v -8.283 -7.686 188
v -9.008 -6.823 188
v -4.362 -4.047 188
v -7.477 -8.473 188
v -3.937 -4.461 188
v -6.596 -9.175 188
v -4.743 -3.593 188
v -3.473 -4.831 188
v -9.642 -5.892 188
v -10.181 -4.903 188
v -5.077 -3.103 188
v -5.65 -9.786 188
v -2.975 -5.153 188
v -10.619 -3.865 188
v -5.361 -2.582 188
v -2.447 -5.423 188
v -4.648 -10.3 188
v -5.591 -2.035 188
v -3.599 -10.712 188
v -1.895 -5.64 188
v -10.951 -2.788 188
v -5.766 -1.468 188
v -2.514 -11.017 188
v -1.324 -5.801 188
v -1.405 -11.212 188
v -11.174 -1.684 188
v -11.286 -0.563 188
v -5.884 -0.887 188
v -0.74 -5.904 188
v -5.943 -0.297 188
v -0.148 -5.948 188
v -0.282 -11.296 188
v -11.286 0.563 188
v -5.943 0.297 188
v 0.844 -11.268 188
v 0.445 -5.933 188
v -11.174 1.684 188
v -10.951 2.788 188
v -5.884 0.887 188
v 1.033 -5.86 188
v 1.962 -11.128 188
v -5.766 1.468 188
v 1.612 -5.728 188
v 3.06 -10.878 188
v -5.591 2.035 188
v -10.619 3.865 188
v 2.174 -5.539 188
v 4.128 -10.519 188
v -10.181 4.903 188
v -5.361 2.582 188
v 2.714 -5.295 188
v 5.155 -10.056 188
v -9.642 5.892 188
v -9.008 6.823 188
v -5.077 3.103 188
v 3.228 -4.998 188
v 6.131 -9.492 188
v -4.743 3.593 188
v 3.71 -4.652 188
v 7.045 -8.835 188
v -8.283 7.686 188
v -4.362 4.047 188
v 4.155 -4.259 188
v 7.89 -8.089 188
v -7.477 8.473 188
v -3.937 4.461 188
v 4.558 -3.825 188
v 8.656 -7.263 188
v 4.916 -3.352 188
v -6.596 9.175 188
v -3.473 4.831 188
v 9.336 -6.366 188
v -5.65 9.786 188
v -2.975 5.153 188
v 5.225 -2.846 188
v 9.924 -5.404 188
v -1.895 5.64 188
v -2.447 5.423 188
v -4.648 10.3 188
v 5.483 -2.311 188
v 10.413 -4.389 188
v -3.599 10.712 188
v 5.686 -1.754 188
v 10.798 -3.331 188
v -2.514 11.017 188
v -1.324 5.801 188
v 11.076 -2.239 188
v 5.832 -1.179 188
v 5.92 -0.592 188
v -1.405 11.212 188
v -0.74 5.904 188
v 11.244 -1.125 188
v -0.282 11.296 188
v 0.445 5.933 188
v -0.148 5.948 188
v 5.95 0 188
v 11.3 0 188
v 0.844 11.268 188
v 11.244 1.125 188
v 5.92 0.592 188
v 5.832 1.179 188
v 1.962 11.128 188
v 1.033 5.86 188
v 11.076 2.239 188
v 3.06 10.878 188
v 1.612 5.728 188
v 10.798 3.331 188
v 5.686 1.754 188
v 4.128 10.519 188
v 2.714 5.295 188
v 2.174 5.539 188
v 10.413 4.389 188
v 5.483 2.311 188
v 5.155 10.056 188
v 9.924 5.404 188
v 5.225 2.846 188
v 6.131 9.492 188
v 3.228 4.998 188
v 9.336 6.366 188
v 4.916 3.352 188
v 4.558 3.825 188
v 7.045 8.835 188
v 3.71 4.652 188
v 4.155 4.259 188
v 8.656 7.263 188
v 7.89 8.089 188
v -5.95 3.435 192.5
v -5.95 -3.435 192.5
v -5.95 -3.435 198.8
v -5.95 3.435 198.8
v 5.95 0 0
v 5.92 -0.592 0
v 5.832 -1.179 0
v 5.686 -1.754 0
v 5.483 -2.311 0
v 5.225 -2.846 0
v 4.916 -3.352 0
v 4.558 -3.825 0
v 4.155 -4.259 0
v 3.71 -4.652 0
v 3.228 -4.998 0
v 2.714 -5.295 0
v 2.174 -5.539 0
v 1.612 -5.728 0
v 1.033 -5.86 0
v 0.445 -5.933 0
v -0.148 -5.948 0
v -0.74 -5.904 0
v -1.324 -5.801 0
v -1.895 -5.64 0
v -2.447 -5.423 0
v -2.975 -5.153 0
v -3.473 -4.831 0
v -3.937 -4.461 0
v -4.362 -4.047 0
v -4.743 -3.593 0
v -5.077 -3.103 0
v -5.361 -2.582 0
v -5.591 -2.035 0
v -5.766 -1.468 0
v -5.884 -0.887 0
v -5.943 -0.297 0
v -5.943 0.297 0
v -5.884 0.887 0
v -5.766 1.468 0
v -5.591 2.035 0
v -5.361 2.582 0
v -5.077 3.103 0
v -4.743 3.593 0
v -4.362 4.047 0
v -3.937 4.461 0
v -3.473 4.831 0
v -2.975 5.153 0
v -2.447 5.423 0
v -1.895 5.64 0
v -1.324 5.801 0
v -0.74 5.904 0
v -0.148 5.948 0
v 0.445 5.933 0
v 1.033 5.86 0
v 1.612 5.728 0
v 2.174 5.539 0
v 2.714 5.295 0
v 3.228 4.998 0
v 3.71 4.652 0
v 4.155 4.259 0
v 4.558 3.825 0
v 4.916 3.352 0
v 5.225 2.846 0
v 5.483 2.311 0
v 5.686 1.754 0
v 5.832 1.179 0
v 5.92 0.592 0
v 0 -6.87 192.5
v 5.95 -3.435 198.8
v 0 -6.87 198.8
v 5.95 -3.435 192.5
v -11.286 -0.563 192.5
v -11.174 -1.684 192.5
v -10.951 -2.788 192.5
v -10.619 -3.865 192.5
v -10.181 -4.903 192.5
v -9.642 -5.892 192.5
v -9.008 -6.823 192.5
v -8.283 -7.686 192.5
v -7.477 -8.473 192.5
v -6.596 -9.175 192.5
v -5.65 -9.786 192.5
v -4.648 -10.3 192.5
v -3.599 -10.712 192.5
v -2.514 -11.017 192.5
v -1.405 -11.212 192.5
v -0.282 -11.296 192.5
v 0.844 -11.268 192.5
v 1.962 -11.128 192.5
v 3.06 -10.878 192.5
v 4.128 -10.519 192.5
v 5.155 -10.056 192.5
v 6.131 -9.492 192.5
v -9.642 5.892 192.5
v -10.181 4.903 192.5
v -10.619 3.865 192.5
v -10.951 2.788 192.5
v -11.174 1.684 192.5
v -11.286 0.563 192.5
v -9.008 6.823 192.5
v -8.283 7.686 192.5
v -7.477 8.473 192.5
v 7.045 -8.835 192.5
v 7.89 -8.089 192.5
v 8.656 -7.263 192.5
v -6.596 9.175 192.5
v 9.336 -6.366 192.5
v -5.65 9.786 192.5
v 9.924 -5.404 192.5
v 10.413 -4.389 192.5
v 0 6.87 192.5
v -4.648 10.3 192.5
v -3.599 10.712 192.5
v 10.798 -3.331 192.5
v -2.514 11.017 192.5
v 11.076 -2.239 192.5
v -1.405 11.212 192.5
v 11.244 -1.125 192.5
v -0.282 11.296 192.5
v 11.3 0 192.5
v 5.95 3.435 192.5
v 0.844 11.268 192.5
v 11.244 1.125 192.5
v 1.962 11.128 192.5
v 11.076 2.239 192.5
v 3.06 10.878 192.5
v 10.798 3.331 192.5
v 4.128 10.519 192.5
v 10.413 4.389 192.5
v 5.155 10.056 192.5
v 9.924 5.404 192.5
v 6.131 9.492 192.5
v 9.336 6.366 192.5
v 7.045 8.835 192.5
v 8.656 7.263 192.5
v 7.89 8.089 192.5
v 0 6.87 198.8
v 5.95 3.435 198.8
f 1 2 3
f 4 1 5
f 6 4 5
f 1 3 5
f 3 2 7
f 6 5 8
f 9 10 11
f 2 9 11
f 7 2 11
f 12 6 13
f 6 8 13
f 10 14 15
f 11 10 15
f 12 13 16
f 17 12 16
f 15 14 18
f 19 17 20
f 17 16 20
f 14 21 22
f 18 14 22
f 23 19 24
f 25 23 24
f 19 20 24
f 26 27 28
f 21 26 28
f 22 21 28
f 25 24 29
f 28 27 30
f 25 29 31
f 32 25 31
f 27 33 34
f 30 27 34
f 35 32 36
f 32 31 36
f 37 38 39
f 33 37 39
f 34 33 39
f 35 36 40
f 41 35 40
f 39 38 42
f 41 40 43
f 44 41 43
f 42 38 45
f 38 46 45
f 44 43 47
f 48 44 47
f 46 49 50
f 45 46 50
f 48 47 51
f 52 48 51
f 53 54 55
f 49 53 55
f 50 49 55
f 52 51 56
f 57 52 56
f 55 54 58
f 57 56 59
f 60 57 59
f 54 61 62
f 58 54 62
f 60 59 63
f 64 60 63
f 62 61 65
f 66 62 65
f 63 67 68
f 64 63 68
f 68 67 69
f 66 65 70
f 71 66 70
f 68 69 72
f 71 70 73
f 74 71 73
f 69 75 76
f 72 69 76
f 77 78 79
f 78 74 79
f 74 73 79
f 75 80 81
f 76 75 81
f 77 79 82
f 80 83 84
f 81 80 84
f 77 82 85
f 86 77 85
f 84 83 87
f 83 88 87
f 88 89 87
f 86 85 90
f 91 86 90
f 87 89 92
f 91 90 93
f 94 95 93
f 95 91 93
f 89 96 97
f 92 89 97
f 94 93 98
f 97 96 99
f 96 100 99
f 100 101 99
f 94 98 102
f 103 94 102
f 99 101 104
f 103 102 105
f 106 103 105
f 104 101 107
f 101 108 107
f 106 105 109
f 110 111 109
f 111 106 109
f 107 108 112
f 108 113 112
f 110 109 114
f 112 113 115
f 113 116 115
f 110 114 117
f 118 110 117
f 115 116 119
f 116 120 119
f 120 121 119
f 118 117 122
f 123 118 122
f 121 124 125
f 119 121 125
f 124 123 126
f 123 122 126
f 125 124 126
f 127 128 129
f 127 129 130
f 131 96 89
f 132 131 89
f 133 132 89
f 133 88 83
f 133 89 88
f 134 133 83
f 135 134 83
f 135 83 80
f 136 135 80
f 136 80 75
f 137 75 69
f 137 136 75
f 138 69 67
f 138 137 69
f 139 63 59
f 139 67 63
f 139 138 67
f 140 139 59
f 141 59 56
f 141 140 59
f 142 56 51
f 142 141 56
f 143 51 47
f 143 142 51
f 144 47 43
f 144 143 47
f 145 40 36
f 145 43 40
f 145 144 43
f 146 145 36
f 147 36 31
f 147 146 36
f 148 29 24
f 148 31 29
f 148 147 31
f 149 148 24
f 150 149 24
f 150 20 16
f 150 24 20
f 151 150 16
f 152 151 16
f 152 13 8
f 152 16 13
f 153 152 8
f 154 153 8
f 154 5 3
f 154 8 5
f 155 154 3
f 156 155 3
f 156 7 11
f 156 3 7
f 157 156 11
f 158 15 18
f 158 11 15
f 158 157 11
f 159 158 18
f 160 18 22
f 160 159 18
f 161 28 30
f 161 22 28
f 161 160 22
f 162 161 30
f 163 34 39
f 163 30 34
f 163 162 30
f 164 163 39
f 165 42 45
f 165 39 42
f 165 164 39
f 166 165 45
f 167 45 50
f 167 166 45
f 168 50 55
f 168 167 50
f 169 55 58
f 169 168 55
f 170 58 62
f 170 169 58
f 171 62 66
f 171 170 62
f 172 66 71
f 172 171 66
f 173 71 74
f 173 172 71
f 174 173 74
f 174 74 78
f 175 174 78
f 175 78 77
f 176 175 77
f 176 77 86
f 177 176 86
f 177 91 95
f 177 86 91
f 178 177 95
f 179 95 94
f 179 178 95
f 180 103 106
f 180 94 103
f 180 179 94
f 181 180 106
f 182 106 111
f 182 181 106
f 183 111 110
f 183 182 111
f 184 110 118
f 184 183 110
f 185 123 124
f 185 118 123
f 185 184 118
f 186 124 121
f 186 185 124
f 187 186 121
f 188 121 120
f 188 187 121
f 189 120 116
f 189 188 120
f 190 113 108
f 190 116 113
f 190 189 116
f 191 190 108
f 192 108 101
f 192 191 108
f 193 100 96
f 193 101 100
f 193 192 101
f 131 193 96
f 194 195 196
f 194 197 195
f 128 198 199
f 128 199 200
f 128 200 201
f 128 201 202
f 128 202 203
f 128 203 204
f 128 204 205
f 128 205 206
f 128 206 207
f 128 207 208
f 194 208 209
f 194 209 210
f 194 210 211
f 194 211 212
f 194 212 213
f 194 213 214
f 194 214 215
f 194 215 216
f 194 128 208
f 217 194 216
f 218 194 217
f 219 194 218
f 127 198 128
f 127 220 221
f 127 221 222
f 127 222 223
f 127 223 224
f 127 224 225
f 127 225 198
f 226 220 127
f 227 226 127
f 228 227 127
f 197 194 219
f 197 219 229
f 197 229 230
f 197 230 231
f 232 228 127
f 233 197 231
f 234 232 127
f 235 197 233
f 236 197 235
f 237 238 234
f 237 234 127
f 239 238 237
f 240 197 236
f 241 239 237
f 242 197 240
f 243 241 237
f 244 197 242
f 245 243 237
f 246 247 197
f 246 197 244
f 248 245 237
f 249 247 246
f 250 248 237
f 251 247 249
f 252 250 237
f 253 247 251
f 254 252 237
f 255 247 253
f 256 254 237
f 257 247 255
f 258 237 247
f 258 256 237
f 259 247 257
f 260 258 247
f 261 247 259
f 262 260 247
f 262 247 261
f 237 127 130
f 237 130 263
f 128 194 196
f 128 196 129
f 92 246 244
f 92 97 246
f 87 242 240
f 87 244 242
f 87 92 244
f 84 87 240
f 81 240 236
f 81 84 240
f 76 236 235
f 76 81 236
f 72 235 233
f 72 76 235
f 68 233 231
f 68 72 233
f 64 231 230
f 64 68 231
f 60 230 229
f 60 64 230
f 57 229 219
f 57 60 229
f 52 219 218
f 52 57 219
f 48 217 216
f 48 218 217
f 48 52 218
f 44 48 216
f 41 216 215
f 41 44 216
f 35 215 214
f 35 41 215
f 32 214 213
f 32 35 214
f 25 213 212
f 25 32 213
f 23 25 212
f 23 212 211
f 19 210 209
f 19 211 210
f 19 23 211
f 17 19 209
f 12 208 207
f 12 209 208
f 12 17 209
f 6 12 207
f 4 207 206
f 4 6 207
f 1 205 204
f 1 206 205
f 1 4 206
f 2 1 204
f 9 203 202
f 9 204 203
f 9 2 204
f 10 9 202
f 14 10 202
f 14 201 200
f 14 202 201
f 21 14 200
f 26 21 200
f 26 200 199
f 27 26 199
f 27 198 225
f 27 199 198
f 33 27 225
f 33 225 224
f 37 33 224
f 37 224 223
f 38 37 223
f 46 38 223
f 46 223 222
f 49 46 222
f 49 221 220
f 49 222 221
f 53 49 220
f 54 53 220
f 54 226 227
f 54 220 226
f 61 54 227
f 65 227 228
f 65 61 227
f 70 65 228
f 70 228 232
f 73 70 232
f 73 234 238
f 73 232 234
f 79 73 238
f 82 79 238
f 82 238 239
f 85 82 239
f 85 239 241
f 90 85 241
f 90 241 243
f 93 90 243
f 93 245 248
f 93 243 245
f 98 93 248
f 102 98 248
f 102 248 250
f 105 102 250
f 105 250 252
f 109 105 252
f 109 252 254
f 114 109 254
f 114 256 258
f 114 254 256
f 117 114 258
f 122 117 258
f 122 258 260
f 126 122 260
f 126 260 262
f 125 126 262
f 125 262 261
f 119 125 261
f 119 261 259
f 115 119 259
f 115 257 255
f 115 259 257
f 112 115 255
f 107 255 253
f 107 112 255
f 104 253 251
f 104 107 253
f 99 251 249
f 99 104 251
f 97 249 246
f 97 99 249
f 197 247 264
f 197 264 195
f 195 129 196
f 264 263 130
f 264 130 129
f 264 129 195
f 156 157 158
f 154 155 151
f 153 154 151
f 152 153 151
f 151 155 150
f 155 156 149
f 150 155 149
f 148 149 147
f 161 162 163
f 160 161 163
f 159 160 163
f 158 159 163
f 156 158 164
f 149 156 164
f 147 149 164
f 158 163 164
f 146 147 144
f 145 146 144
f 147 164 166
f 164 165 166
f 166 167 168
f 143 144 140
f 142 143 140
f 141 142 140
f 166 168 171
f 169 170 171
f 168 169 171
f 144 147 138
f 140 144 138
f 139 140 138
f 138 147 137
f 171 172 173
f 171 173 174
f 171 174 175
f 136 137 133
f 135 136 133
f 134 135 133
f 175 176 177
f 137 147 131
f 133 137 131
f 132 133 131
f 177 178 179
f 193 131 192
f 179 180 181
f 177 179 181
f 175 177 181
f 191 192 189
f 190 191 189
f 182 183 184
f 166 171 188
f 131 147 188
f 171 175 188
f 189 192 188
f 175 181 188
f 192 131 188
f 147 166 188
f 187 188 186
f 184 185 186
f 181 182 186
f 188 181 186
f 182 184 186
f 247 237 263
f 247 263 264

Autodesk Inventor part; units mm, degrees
ref_plane "YZ Plane" through (0, 0, 0) normal (1, 0, 0) x (0, 1, 0)
ref_plane "XZ Plane" through (0, 0, 0) normal (0, 1, 0) x (-1, 0, 0)
ref_plane "XY Plane" through (0, 0, 0) normal (0, 0, 1) x (1, 0, 0)
sketch "スケッチ1" plane through (0, 0, 0) normal (0, 0, 1) x (1, 0, 0)
  circle A0 centre (0, 0) radius 5.95
  dimension "d0" = 11.9
extrude "押し出し1" add sketch "スケッチ1" along normal blind 188
thread "ねじ1" size "M12x1.75" class "6g" standard "ANSI Metric M Profile" length 17
sketch "スケッチ3" plane through (0, 0, 188) normal (0, 0, 1) x (1, 0, 0)
  circle A0 centre (0, 0) radius 11.3
  dimension "d5" = 22.6
extrude "押し出し2" add sketch "スケッチ3" along normal blind 4.5
sketch "スケッチ4" plane through (0, 0, 192.5) normal (0, 0, 1) x (1, 0, 0)
  circle A0 centre (0, 0) radius 5.95 construction
  line L0 (5.95, -3.4352) -> (0, -6.8705)
  line L1 (0, -6.8705) -> (-5.95, -3.4352)
  line L2 (-5.95, -3.4352) -> (-5.95, 3.4352)
  line L3 (-5.95, 3.4352) -> (0, 6.8705)
  line L4 (0, 6.8705) -> (5.95, 3.4352)
  line L5 (5.95, 3.4352) -> (5.95, -3.4352)
  point P0 (5.95, 0)
extrude "押し出し3" add sketch "スケッチ4" along normal blind 6.3
properties part number "前輪シャフト"
